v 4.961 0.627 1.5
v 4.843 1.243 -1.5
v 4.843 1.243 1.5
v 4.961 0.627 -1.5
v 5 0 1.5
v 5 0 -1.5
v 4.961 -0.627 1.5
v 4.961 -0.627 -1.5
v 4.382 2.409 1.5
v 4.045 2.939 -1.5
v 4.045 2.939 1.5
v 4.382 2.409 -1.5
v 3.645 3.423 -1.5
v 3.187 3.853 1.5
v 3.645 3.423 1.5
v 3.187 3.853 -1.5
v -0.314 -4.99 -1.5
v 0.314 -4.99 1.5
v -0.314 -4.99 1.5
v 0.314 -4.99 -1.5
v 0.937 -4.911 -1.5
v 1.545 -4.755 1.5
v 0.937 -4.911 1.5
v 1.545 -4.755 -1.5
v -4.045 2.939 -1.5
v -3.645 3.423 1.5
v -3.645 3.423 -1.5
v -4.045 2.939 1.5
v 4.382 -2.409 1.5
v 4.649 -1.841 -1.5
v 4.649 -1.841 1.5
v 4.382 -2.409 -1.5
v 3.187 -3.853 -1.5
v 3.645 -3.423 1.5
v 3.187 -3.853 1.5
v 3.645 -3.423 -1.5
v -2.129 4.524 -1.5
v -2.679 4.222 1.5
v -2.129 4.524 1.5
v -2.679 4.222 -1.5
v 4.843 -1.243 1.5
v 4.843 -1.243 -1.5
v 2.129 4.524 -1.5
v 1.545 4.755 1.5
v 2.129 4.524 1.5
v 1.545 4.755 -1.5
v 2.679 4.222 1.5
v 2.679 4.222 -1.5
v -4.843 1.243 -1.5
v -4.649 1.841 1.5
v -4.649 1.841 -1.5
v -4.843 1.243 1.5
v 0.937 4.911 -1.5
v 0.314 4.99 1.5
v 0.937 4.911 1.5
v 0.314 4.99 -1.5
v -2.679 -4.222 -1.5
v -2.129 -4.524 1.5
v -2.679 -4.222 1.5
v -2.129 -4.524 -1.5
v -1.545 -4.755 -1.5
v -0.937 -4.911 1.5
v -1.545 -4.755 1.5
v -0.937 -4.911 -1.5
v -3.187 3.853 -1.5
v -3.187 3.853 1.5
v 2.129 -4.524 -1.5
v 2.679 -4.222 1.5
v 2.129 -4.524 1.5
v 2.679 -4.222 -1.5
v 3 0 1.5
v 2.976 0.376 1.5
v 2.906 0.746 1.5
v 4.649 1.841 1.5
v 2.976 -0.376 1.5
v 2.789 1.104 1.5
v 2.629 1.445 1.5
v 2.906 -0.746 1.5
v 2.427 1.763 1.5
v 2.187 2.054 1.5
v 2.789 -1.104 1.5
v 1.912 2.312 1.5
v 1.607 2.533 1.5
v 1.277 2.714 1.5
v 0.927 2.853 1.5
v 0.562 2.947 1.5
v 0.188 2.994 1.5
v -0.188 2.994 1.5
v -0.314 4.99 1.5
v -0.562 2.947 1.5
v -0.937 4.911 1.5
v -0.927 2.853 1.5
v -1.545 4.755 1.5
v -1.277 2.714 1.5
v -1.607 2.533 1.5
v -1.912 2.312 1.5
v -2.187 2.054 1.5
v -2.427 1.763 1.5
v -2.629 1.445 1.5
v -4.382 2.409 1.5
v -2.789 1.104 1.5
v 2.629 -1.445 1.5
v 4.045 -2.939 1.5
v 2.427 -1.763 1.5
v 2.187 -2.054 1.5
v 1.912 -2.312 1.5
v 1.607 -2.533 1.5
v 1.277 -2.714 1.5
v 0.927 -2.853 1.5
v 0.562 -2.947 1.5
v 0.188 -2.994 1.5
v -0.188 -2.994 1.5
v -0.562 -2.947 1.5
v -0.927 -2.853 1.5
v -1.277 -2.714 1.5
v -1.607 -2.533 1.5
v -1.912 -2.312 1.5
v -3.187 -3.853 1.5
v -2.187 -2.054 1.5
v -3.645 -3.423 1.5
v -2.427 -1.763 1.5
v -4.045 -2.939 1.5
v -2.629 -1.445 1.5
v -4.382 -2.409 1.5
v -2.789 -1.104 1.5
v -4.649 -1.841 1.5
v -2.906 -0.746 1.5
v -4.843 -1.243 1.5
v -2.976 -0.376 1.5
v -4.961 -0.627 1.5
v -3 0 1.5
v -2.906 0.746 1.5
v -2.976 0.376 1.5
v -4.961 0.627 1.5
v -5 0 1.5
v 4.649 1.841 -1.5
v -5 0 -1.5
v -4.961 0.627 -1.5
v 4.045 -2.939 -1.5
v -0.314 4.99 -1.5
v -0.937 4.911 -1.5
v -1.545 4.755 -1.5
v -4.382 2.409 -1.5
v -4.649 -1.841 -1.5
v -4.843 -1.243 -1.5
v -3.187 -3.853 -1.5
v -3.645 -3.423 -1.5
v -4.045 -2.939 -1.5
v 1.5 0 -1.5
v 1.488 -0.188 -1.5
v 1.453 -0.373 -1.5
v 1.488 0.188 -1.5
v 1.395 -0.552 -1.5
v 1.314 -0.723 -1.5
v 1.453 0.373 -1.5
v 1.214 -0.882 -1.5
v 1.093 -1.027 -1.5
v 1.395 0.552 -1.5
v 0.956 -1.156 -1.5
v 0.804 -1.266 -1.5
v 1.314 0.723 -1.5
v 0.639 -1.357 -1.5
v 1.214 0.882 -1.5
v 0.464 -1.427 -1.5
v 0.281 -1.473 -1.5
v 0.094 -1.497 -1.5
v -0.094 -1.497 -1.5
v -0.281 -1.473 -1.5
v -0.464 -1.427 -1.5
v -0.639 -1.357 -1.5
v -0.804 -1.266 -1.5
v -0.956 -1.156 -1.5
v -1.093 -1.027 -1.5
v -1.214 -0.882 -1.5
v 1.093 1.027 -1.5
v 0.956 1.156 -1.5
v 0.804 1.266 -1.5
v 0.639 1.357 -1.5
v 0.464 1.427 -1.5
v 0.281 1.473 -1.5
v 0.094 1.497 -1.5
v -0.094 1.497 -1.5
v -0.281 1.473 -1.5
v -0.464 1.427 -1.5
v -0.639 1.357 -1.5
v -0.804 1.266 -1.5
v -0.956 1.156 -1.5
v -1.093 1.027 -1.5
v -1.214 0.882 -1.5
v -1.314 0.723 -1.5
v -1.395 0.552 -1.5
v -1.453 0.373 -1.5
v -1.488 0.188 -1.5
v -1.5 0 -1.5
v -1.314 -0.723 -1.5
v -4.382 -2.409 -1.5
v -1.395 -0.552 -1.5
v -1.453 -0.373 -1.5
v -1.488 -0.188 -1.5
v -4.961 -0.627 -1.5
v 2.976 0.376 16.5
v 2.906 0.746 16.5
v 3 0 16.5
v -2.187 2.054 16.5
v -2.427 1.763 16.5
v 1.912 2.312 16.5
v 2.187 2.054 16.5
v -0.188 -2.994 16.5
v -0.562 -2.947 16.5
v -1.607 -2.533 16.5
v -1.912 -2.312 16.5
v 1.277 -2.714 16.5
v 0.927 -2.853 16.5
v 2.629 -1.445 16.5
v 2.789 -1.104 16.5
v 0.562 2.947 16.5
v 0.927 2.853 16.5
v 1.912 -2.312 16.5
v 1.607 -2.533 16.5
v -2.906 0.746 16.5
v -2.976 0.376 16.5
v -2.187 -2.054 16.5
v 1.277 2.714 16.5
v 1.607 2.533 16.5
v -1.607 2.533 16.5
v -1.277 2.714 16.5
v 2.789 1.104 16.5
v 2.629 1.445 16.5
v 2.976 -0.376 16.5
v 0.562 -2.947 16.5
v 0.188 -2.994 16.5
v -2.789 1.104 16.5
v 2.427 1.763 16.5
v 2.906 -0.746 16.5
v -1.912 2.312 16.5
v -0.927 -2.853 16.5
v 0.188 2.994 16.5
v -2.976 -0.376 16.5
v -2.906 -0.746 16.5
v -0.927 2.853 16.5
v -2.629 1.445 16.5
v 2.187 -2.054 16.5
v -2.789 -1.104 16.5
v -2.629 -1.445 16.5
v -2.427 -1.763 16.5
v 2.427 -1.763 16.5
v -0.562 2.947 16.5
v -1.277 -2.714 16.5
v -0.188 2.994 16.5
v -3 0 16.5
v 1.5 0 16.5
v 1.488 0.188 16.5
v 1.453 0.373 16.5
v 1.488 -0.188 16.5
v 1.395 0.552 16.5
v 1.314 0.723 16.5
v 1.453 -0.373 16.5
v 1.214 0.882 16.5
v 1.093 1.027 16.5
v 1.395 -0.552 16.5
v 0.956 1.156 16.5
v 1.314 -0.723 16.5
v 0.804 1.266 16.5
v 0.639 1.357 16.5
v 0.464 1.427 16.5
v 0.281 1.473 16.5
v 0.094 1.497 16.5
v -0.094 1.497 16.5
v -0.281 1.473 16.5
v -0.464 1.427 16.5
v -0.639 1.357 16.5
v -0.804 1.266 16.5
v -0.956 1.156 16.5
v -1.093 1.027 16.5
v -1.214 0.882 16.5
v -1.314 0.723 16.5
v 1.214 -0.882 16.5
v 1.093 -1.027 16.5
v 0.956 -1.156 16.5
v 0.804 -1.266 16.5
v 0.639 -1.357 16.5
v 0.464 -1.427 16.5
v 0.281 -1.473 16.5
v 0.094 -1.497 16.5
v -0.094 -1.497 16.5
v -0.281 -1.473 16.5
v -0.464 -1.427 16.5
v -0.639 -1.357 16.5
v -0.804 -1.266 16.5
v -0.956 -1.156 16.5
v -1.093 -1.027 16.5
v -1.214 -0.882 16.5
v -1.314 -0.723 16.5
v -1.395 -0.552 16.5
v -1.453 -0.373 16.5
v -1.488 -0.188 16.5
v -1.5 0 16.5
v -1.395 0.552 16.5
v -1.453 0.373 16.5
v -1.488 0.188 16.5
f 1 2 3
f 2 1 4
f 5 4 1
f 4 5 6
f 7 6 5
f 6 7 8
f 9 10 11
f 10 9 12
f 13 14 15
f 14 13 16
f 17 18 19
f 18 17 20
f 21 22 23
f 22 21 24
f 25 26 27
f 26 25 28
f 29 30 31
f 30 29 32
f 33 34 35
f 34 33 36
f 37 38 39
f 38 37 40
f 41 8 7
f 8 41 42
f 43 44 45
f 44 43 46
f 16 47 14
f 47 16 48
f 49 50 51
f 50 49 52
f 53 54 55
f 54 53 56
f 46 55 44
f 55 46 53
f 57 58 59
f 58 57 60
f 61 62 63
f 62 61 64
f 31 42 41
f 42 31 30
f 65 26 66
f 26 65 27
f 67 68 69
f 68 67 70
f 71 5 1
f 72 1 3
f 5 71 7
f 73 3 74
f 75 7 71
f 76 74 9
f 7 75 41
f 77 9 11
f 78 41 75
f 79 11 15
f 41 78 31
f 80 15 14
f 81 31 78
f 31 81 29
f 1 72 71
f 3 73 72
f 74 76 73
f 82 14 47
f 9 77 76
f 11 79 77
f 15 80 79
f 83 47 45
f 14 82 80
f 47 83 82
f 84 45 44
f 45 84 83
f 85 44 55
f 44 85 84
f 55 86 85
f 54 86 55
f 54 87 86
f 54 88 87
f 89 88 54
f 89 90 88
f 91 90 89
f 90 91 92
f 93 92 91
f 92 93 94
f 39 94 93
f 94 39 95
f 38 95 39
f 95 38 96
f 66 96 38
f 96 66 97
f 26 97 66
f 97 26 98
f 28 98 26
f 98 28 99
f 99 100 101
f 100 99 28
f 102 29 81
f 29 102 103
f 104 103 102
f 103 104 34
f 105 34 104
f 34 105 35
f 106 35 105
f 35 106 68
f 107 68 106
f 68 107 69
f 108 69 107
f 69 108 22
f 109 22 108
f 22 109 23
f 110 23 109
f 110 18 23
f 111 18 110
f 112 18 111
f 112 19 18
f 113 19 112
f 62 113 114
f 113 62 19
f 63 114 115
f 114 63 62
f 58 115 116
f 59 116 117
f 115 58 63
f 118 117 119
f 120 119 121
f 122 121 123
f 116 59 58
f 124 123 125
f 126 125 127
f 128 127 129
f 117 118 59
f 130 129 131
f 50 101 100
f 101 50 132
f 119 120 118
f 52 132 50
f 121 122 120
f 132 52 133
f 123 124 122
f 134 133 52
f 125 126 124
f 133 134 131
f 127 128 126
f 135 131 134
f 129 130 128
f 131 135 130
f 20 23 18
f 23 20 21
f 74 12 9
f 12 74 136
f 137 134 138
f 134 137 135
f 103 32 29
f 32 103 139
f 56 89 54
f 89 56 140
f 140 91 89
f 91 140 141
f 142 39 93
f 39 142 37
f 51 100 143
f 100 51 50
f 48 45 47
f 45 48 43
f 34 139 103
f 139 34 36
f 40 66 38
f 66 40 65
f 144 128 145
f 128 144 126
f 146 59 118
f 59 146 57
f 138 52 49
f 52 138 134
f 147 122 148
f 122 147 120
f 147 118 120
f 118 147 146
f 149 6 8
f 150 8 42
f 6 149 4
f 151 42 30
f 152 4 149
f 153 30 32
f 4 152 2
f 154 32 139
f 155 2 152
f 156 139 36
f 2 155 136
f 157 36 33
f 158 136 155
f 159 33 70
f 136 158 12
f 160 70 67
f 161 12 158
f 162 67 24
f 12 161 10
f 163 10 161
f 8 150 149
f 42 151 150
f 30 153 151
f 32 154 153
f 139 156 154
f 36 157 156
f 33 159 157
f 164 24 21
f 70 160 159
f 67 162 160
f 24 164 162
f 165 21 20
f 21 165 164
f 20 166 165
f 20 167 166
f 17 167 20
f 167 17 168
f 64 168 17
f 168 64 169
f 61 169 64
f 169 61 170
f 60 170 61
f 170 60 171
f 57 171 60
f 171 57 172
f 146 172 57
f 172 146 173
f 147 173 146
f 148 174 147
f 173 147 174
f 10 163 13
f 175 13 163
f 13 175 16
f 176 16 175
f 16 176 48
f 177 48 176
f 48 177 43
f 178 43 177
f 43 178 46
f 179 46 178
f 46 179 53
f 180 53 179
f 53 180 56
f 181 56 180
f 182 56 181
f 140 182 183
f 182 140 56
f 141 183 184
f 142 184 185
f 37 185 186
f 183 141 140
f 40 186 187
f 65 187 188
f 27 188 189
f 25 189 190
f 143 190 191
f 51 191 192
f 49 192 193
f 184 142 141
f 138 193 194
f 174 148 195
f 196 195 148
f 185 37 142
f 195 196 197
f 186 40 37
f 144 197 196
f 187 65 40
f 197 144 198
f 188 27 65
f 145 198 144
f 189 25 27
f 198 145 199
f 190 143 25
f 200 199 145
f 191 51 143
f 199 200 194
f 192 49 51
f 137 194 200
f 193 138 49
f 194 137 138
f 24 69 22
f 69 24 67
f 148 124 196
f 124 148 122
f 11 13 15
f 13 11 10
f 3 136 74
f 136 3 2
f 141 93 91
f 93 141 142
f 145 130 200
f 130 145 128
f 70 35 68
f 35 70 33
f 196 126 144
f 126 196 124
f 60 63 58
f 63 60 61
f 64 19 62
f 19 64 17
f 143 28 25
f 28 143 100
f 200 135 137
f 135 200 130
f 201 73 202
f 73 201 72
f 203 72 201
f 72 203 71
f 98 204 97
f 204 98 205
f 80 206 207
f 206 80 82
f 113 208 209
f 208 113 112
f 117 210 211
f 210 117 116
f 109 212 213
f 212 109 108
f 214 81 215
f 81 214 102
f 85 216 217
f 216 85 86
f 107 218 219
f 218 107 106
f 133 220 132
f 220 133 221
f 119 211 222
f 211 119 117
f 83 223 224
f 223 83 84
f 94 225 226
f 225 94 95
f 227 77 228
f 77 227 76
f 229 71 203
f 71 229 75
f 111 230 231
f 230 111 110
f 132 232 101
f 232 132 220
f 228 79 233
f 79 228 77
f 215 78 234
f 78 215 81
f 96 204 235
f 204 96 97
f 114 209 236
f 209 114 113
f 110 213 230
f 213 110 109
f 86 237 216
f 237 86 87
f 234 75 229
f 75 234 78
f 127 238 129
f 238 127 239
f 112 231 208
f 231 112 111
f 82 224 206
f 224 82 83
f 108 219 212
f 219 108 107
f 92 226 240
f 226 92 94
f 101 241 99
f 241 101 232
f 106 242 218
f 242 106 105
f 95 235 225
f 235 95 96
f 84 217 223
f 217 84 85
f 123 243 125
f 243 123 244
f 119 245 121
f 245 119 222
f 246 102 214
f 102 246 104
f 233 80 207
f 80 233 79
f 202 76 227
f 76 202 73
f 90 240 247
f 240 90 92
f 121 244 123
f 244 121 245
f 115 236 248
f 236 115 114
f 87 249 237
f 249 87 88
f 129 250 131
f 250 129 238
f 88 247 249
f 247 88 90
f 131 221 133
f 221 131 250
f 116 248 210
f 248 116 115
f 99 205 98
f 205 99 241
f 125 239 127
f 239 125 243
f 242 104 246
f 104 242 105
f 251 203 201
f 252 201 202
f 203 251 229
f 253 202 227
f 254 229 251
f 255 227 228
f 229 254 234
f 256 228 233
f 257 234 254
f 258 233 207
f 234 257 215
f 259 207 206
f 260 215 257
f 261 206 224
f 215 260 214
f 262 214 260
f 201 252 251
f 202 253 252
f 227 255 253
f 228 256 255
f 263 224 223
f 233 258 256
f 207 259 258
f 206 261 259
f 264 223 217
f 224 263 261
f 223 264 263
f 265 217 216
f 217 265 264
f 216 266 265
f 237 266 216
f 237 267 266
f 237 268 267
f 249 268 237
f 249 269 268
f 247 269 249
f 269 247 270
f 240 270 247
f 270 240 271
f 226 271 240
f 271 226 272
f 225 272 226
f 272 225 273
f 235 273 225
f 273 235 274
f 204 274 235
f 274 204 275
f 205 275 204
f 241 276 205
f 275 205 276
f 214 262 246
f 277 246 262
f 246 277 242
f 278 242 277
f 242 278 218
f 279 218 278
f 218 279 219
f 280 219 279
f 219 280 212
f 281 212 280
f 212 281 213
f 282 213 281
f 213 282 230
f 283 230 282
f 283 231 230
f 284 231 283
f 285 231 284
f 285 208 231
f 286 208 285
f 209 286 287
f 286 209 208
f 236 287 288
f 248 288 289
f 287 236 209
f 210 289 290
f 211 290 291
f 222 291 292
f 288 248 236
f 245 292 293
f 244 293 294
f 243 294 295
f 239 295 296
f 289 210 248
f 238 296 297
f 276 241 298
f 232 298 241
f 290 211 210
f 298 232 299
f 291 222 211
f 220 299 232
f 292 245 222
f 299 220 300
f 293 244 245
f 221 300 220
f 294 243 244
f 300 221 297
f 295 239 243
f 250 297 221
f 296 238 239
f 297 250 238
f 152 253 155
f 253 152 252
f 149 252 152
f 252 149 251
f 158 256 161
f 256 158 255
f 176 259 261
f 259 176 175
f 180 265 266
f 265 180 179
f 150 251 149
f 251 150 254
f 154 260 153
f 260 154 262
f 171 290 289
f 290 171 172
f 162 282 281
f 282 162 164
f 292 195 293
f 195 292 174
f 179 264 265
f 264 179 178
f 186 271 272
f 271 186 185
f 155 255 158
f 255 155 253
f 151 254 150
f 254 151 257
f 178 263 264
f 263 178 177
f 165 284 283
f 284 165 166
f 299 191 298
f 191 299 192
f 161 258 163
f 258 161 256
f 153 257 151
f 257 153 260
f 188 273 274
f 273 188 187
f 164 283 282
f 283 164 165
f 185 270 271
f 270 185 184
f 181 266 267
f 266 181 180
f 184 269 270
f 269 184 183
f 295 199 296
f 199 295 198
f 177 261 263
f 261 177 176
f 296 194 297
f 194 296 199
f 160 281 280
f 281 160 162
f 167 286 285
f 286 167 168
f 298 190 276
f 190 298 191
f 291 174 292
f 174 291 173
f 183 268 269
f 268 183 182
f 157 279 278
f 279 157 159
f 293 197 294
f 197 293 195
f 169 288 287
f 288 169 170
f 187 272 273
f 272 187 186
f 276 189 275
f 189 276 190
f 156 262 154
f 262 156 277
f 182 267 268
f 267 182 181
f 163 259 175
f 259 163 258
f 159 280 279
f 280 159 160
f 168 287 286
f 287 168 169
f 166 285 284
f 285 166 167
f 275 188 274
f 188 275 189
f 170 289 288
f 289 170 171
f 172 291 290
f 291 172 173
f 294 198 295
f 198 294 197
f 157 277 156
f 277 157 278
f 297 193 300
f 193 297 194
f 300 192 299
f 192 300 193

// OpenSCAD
$fn = 50;


difference() {
	union() {
		translate(v = [0, 0, -1.5000000000]) {
			cylinder(h = 3, r = 5.0000000000);
		}
		translate(v = [0, 0, -1.5000000000]) {
			cylinder(h = 18, r = 3.0000000000);
		}
	}
	union() {
		translate(v = [0, 0, -100.0000000000]) {
			cylinder(h = 200, r = 1.5000000000);
		}
	}
}
